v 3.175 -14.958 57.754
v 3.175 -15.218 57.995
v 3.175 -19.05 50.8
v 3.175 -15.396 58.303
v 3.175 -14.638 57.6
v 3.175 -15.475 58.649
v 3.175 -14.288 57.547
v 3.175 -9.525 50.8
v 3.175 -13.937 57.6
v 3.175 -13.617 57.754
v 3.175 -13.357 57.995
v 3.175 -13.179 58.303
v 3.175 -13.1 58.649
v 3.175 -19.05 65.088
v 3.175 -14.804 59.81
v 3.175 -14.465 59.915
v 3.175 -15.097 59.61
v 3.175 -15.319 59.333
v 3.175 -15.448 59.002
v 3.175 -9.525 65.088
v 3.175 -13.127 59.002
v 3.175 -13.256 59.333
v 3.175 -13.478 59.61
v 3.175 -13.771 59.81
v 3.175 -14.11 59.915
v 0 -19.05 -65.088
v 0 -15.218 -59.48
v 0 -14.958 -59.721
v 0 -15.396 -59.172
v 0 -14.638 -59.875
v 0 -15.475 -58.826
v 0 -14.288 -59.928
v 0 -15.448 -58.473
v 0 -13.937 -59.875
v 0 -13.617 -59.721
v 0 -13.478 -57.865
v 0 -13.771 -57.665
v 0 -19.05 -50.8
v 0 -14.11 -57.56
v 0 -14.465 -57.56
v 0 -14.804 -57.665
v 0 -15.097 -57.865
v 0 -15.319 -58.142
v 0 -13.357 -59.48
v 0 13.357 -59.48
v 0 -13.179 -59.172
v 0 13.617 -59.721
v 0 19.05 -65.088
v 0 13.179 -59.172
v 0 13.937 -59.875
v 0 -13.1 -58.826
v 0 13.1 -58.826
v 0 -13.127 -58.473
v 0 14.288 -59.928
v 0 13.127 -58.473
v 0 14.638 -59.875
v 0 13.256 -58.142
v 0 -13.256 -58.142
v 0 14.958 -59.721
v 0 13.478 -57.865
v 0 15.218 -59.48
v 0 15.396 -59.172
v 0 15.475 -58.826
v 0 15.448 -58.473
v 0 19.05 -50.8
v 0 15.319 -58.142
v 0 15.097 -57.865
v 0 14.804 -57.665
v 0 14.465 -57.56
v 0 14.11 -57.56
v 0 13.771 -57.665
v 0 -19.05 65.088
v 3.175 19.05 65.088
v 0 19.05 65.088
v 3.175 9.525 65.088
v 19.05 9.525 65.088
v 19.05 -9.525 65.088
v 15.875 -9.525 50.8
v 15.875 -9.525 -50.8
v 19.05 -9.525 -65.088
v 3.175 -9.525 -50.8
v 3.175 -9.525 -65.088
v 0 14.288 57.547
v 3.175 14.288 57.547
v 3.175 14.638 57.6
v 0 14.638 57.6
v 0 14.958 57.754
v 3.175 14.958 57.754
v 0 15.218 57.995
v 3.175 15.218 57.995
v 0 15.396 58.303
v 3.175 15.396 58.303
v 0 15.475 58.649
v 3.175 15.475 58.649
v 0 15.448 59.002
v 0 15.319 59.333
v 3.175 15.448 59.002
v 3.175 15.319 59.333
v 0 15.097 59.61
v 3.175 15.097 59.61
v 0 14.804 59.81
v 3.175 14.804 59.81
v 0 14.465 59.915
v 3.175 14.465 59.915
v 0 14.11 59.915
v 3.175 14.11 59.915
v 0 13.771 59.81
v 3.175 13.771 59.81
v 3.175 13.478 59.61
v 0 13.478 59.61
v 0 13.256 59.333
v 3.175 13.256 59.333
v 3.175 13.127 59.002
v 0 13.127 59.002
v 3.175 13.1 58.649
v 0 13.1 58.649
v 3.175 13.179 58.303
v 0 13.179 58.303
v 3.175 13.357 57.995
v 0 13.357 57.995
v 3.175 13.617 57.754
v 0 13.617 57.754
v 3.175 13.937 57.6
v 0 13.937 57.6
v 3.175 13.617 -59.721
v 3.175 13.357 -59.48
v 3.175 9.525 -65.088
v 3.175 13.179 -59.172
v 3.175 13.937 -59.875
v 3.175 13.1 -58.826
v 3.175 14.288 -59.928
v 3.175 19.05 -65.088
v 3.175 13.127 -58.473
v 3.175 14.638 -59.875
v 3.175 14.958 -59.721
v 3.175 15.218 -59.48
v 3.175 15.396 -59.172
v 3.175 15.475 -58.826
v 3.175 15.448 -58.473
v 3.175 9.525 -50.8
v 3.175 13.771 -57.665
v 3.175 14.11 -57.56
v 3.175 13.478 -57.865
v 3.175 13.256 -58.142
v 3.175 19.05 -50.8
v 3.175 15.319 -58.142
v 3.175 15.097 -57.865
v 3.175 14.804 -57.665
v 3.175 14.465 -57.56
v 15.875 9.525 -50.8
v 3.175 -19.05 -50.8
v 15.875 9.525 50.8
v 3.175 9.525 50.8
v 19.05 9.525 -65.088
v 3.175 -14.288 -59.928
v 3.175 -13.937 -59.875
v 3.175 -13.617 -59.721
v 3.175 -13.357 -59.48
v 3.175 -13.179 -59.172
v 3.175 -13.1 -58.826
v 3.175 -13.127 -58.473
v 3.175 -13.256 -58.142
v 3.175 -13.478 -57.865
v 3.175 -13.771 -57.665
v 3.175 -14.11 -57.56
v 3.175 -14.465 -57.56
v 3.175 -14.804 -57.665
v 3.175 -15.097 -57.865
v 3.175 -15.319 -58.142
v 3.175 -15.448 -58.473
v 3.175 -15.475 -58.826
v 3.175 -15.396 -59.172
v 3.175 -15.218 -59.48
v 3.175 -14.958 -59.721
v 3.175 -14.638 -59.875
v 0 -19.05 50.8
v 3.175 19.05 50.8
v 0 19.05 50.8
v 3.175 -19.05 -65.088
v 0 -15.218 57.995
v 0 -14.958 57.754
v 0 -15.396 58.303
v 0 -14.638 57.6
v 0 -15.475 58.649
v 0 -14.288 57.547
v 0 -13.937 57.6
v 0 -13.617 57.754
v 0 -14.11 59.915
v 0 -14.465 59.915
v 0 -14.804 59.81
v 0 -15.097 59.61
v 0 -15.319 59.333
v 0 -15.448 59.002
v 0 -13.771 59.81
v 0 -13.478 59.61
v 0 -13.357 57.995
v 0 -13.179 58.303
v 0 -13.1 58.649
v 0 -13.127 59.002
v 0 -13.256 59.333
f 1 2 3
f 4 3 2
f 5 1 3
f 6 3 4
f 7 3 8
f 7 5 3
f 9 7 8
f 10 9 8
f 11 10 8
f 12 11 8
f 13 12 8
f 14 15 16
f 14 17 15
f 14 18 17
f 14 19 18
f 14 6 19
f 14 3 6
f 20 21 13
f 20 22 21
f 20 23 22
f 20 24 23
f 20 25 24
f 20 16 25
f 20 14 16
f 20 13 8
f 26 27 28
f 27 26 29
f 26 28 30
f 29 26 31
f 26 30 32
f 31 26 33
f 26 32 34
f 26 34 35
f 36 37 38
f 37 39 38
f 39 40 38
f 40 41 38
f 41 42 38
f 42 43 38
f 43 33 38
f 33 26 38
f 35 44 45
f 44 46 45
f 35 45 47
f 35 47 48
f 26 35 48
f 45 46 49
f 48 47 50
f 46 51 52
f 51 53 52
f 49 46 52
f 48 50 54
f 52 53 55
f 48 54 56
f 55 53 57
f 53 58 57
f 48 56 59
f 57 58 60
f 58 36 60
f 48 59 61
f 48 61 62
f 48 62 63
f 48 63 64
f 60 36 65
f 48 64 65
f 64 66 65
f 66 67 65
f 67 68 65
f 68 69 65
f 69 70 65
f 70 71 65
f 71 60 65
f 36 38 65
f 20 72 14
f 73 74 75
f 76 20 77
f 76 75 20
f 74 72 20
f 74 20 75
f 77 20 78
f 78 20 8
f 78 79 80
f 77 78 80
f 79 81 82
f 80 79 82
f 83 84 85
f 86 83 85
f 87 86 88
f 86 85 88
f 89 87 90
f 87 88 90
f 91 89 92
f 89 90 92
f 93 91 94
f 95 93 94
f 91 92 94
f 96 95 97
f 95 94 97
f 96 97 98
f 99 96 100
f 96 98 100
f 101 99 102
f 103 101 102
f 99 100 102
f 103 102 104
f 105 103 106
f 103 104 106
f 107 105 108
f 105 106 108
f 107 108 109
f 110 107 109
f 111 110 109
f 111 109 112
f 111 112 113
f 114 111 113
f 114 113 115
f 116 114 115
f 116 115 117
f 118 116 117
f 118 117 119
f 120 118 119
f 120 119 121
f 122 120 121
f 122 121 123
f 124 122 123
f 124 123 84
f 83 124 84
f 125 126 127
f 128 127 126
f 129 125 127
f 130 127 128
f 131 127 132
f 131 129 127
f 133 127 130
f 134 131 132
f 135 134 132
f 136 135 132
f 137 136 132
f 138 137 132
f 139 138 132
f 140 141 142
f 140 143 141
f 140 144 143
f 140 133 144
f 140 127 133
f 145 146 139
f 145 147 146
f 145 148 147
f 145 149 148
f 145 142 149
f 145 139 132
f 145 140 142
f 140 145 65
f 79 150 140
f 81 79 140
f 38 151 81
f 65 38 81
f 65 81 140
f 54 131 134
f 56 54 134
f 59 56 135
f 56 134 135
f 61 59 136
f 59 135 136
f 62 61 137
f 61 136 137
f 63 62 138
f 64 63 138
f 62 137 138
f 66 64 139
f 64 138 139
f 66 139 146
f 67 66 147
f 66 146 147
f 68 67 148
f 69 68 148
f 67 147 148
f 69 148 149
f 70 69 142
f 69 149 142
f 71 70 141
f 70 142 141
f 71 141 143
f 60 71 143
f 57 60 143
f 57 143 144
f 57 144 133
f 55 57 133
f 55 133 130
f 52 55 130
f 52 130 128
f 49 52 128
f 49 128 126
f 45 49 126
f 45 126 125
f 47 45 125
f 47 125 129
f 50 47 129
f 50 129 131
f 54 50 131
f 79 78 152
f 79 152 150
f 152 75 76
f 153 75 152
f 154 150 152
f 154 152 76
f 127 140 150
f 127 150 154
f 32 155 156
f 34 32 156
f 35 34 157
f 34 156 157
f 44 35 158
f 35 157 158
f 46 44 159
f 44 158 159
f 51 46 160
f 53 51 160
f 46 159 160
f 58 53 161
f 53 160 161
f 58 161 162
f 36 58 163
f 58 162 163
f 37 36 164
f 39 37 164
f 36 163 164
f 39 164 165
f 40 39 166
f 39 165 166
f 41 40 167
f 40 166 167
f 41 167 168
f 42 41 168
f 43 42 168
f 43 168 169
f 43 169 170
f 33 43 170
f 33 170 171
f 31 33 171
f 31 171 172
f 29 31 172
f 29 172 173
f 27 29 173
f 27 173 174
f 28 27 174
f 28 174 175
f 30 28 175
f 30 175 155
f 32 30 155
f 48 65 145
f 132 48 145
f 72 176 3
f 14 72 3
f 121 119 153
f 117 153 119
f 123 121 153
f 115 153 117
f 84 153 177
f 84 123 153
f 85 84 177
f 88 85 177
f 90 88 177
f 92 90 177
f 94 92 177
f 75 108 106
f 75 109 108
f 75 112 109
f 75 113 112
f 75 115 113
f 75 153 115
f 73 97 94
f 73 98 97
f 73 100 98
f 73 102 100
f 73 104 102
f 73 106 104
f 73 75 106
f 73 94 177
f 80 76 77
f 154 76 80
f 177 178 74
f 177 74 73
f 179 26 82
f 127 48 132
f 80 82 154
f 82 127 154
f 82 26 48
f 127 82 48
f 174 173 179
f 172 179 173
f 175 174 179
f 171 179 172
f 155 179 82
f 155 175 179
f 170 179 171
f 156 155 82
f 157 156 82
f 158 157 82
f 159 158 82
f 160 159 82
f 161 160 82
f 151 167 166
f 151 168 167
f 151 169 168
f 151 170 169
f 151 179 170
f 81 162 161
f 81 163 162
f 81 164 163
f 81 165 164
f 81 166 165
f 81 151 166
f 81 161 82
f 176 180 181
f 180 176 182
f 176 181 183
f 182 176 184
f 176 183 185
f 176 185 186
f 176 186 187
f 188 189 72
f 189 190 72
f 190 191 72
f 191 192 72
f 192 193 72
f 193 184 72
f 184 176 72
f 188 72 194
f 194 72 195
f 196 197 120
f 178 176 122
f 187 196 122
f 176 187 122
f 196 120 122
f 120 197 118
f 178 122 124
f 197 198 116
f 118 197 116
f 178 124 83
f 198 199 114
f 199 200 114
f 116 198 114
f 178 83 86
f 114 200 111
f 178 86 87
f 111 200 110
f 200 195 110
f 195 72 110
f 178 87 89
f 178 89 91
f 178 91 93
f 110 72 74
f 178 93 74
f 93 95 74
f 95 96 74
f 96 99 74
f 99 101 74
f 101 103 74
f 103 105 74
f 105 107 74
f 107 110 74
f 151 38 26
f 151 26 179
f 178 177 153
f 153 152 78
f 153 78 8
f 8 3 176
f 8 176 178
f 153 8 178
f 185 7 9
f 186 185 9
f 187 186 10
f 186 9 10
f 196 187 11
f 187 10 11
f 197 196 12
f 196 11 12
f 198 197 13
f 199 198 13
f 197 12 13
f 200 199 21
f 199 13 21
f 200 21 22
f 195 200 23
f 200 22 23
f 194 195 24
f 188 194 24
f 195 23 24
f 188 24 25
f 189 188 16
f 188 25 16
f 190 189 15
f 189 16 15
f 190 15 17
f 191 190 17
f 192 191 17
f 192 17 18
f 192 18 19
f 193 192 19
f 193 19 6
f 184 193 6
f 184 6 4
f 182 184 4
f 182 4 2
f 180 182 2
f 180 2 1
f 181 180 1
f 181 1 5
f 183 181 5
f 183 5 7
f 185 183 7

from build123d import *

# Parameters (mm, degrees)
SKETCH1_W           = 130.175
SKETCH1_H           = 19.05
BOSS_EXTRUDE1_DEPTH = 19.05
SKETCH2_W           = 3.175
SKETCH2_H           = 38.1
BOSS_EXTRUDE2_DEPTH = 130.175
SKETCH4_R           = 1.190625
CUT_EXTRUDE1_DEPTH  = 4.175
SKETCH5_W           = 15.875
SKETCH5_H           = 101.6
CUT_EXTRUDE2_DEPTH  = 39.1


with BuildPart() as part:
    # Sketch1 → Boss-Extrude1 (new body)
    with BuildSketch(Plane(origin=(0, 0, 0), x_dir=(0, 0, -1), z_dir=(1, 0, 0))):
        Rectangle(SKETCH1_W, SKETCH1_H)
    extrude(amount=BOSS_EXTRUDE1_DEPTH)

    # Sketch2 → Boss-Extrude2 (add)
    with BuildSketch(Plane.XY.offset(65.0875)):
        with Locations((1.5875, 0)):
            Rectangle(SKETCH2_W, SKETCH2_H)
    extrude(amount=-BOSS_EXTRUDE2_DEPTH)

    # Sketch4 → Cut-Extrude1 (cut, through all)
    with BuildSketch(Plane(origin=(3.175, 0, 0), x_dir=(0, 0, -1), z_dir=(1, 0, 0))):
        with Locations((-58.7375, -14.2875)):
            Circle(SKETCH4_R)
        with Locations((58.7375, -14.2875)):
            Circle(SKETCH4_R)
        with Locations((58.7375, 14.2875)):
            Circle(SKETCH4_R)
        with Locations((-58.7375, 14.2875)):
            Circle(SKETCH4_R)
    extrude(amount=-CUT_EXTRUDE1_DEPTH, mode=Mode.SUBTRACT)

    # Sketch5 → Cut-Extrude2 (cut, through all)
    with BuildSketch(Plane(origin=(0, -19.05, 0), x_dir=(-1, 0, 0), z_dir=(0, -1, 0))):
        with Locations((-7.9375, 0)):
            Rectangle(SKETCH5_W, SKETCH5_H)
    extrude(amount=-CUT_EXTRUDE2_DEPTH, mode=Mode.SUBTRACT)


solid = part.part
